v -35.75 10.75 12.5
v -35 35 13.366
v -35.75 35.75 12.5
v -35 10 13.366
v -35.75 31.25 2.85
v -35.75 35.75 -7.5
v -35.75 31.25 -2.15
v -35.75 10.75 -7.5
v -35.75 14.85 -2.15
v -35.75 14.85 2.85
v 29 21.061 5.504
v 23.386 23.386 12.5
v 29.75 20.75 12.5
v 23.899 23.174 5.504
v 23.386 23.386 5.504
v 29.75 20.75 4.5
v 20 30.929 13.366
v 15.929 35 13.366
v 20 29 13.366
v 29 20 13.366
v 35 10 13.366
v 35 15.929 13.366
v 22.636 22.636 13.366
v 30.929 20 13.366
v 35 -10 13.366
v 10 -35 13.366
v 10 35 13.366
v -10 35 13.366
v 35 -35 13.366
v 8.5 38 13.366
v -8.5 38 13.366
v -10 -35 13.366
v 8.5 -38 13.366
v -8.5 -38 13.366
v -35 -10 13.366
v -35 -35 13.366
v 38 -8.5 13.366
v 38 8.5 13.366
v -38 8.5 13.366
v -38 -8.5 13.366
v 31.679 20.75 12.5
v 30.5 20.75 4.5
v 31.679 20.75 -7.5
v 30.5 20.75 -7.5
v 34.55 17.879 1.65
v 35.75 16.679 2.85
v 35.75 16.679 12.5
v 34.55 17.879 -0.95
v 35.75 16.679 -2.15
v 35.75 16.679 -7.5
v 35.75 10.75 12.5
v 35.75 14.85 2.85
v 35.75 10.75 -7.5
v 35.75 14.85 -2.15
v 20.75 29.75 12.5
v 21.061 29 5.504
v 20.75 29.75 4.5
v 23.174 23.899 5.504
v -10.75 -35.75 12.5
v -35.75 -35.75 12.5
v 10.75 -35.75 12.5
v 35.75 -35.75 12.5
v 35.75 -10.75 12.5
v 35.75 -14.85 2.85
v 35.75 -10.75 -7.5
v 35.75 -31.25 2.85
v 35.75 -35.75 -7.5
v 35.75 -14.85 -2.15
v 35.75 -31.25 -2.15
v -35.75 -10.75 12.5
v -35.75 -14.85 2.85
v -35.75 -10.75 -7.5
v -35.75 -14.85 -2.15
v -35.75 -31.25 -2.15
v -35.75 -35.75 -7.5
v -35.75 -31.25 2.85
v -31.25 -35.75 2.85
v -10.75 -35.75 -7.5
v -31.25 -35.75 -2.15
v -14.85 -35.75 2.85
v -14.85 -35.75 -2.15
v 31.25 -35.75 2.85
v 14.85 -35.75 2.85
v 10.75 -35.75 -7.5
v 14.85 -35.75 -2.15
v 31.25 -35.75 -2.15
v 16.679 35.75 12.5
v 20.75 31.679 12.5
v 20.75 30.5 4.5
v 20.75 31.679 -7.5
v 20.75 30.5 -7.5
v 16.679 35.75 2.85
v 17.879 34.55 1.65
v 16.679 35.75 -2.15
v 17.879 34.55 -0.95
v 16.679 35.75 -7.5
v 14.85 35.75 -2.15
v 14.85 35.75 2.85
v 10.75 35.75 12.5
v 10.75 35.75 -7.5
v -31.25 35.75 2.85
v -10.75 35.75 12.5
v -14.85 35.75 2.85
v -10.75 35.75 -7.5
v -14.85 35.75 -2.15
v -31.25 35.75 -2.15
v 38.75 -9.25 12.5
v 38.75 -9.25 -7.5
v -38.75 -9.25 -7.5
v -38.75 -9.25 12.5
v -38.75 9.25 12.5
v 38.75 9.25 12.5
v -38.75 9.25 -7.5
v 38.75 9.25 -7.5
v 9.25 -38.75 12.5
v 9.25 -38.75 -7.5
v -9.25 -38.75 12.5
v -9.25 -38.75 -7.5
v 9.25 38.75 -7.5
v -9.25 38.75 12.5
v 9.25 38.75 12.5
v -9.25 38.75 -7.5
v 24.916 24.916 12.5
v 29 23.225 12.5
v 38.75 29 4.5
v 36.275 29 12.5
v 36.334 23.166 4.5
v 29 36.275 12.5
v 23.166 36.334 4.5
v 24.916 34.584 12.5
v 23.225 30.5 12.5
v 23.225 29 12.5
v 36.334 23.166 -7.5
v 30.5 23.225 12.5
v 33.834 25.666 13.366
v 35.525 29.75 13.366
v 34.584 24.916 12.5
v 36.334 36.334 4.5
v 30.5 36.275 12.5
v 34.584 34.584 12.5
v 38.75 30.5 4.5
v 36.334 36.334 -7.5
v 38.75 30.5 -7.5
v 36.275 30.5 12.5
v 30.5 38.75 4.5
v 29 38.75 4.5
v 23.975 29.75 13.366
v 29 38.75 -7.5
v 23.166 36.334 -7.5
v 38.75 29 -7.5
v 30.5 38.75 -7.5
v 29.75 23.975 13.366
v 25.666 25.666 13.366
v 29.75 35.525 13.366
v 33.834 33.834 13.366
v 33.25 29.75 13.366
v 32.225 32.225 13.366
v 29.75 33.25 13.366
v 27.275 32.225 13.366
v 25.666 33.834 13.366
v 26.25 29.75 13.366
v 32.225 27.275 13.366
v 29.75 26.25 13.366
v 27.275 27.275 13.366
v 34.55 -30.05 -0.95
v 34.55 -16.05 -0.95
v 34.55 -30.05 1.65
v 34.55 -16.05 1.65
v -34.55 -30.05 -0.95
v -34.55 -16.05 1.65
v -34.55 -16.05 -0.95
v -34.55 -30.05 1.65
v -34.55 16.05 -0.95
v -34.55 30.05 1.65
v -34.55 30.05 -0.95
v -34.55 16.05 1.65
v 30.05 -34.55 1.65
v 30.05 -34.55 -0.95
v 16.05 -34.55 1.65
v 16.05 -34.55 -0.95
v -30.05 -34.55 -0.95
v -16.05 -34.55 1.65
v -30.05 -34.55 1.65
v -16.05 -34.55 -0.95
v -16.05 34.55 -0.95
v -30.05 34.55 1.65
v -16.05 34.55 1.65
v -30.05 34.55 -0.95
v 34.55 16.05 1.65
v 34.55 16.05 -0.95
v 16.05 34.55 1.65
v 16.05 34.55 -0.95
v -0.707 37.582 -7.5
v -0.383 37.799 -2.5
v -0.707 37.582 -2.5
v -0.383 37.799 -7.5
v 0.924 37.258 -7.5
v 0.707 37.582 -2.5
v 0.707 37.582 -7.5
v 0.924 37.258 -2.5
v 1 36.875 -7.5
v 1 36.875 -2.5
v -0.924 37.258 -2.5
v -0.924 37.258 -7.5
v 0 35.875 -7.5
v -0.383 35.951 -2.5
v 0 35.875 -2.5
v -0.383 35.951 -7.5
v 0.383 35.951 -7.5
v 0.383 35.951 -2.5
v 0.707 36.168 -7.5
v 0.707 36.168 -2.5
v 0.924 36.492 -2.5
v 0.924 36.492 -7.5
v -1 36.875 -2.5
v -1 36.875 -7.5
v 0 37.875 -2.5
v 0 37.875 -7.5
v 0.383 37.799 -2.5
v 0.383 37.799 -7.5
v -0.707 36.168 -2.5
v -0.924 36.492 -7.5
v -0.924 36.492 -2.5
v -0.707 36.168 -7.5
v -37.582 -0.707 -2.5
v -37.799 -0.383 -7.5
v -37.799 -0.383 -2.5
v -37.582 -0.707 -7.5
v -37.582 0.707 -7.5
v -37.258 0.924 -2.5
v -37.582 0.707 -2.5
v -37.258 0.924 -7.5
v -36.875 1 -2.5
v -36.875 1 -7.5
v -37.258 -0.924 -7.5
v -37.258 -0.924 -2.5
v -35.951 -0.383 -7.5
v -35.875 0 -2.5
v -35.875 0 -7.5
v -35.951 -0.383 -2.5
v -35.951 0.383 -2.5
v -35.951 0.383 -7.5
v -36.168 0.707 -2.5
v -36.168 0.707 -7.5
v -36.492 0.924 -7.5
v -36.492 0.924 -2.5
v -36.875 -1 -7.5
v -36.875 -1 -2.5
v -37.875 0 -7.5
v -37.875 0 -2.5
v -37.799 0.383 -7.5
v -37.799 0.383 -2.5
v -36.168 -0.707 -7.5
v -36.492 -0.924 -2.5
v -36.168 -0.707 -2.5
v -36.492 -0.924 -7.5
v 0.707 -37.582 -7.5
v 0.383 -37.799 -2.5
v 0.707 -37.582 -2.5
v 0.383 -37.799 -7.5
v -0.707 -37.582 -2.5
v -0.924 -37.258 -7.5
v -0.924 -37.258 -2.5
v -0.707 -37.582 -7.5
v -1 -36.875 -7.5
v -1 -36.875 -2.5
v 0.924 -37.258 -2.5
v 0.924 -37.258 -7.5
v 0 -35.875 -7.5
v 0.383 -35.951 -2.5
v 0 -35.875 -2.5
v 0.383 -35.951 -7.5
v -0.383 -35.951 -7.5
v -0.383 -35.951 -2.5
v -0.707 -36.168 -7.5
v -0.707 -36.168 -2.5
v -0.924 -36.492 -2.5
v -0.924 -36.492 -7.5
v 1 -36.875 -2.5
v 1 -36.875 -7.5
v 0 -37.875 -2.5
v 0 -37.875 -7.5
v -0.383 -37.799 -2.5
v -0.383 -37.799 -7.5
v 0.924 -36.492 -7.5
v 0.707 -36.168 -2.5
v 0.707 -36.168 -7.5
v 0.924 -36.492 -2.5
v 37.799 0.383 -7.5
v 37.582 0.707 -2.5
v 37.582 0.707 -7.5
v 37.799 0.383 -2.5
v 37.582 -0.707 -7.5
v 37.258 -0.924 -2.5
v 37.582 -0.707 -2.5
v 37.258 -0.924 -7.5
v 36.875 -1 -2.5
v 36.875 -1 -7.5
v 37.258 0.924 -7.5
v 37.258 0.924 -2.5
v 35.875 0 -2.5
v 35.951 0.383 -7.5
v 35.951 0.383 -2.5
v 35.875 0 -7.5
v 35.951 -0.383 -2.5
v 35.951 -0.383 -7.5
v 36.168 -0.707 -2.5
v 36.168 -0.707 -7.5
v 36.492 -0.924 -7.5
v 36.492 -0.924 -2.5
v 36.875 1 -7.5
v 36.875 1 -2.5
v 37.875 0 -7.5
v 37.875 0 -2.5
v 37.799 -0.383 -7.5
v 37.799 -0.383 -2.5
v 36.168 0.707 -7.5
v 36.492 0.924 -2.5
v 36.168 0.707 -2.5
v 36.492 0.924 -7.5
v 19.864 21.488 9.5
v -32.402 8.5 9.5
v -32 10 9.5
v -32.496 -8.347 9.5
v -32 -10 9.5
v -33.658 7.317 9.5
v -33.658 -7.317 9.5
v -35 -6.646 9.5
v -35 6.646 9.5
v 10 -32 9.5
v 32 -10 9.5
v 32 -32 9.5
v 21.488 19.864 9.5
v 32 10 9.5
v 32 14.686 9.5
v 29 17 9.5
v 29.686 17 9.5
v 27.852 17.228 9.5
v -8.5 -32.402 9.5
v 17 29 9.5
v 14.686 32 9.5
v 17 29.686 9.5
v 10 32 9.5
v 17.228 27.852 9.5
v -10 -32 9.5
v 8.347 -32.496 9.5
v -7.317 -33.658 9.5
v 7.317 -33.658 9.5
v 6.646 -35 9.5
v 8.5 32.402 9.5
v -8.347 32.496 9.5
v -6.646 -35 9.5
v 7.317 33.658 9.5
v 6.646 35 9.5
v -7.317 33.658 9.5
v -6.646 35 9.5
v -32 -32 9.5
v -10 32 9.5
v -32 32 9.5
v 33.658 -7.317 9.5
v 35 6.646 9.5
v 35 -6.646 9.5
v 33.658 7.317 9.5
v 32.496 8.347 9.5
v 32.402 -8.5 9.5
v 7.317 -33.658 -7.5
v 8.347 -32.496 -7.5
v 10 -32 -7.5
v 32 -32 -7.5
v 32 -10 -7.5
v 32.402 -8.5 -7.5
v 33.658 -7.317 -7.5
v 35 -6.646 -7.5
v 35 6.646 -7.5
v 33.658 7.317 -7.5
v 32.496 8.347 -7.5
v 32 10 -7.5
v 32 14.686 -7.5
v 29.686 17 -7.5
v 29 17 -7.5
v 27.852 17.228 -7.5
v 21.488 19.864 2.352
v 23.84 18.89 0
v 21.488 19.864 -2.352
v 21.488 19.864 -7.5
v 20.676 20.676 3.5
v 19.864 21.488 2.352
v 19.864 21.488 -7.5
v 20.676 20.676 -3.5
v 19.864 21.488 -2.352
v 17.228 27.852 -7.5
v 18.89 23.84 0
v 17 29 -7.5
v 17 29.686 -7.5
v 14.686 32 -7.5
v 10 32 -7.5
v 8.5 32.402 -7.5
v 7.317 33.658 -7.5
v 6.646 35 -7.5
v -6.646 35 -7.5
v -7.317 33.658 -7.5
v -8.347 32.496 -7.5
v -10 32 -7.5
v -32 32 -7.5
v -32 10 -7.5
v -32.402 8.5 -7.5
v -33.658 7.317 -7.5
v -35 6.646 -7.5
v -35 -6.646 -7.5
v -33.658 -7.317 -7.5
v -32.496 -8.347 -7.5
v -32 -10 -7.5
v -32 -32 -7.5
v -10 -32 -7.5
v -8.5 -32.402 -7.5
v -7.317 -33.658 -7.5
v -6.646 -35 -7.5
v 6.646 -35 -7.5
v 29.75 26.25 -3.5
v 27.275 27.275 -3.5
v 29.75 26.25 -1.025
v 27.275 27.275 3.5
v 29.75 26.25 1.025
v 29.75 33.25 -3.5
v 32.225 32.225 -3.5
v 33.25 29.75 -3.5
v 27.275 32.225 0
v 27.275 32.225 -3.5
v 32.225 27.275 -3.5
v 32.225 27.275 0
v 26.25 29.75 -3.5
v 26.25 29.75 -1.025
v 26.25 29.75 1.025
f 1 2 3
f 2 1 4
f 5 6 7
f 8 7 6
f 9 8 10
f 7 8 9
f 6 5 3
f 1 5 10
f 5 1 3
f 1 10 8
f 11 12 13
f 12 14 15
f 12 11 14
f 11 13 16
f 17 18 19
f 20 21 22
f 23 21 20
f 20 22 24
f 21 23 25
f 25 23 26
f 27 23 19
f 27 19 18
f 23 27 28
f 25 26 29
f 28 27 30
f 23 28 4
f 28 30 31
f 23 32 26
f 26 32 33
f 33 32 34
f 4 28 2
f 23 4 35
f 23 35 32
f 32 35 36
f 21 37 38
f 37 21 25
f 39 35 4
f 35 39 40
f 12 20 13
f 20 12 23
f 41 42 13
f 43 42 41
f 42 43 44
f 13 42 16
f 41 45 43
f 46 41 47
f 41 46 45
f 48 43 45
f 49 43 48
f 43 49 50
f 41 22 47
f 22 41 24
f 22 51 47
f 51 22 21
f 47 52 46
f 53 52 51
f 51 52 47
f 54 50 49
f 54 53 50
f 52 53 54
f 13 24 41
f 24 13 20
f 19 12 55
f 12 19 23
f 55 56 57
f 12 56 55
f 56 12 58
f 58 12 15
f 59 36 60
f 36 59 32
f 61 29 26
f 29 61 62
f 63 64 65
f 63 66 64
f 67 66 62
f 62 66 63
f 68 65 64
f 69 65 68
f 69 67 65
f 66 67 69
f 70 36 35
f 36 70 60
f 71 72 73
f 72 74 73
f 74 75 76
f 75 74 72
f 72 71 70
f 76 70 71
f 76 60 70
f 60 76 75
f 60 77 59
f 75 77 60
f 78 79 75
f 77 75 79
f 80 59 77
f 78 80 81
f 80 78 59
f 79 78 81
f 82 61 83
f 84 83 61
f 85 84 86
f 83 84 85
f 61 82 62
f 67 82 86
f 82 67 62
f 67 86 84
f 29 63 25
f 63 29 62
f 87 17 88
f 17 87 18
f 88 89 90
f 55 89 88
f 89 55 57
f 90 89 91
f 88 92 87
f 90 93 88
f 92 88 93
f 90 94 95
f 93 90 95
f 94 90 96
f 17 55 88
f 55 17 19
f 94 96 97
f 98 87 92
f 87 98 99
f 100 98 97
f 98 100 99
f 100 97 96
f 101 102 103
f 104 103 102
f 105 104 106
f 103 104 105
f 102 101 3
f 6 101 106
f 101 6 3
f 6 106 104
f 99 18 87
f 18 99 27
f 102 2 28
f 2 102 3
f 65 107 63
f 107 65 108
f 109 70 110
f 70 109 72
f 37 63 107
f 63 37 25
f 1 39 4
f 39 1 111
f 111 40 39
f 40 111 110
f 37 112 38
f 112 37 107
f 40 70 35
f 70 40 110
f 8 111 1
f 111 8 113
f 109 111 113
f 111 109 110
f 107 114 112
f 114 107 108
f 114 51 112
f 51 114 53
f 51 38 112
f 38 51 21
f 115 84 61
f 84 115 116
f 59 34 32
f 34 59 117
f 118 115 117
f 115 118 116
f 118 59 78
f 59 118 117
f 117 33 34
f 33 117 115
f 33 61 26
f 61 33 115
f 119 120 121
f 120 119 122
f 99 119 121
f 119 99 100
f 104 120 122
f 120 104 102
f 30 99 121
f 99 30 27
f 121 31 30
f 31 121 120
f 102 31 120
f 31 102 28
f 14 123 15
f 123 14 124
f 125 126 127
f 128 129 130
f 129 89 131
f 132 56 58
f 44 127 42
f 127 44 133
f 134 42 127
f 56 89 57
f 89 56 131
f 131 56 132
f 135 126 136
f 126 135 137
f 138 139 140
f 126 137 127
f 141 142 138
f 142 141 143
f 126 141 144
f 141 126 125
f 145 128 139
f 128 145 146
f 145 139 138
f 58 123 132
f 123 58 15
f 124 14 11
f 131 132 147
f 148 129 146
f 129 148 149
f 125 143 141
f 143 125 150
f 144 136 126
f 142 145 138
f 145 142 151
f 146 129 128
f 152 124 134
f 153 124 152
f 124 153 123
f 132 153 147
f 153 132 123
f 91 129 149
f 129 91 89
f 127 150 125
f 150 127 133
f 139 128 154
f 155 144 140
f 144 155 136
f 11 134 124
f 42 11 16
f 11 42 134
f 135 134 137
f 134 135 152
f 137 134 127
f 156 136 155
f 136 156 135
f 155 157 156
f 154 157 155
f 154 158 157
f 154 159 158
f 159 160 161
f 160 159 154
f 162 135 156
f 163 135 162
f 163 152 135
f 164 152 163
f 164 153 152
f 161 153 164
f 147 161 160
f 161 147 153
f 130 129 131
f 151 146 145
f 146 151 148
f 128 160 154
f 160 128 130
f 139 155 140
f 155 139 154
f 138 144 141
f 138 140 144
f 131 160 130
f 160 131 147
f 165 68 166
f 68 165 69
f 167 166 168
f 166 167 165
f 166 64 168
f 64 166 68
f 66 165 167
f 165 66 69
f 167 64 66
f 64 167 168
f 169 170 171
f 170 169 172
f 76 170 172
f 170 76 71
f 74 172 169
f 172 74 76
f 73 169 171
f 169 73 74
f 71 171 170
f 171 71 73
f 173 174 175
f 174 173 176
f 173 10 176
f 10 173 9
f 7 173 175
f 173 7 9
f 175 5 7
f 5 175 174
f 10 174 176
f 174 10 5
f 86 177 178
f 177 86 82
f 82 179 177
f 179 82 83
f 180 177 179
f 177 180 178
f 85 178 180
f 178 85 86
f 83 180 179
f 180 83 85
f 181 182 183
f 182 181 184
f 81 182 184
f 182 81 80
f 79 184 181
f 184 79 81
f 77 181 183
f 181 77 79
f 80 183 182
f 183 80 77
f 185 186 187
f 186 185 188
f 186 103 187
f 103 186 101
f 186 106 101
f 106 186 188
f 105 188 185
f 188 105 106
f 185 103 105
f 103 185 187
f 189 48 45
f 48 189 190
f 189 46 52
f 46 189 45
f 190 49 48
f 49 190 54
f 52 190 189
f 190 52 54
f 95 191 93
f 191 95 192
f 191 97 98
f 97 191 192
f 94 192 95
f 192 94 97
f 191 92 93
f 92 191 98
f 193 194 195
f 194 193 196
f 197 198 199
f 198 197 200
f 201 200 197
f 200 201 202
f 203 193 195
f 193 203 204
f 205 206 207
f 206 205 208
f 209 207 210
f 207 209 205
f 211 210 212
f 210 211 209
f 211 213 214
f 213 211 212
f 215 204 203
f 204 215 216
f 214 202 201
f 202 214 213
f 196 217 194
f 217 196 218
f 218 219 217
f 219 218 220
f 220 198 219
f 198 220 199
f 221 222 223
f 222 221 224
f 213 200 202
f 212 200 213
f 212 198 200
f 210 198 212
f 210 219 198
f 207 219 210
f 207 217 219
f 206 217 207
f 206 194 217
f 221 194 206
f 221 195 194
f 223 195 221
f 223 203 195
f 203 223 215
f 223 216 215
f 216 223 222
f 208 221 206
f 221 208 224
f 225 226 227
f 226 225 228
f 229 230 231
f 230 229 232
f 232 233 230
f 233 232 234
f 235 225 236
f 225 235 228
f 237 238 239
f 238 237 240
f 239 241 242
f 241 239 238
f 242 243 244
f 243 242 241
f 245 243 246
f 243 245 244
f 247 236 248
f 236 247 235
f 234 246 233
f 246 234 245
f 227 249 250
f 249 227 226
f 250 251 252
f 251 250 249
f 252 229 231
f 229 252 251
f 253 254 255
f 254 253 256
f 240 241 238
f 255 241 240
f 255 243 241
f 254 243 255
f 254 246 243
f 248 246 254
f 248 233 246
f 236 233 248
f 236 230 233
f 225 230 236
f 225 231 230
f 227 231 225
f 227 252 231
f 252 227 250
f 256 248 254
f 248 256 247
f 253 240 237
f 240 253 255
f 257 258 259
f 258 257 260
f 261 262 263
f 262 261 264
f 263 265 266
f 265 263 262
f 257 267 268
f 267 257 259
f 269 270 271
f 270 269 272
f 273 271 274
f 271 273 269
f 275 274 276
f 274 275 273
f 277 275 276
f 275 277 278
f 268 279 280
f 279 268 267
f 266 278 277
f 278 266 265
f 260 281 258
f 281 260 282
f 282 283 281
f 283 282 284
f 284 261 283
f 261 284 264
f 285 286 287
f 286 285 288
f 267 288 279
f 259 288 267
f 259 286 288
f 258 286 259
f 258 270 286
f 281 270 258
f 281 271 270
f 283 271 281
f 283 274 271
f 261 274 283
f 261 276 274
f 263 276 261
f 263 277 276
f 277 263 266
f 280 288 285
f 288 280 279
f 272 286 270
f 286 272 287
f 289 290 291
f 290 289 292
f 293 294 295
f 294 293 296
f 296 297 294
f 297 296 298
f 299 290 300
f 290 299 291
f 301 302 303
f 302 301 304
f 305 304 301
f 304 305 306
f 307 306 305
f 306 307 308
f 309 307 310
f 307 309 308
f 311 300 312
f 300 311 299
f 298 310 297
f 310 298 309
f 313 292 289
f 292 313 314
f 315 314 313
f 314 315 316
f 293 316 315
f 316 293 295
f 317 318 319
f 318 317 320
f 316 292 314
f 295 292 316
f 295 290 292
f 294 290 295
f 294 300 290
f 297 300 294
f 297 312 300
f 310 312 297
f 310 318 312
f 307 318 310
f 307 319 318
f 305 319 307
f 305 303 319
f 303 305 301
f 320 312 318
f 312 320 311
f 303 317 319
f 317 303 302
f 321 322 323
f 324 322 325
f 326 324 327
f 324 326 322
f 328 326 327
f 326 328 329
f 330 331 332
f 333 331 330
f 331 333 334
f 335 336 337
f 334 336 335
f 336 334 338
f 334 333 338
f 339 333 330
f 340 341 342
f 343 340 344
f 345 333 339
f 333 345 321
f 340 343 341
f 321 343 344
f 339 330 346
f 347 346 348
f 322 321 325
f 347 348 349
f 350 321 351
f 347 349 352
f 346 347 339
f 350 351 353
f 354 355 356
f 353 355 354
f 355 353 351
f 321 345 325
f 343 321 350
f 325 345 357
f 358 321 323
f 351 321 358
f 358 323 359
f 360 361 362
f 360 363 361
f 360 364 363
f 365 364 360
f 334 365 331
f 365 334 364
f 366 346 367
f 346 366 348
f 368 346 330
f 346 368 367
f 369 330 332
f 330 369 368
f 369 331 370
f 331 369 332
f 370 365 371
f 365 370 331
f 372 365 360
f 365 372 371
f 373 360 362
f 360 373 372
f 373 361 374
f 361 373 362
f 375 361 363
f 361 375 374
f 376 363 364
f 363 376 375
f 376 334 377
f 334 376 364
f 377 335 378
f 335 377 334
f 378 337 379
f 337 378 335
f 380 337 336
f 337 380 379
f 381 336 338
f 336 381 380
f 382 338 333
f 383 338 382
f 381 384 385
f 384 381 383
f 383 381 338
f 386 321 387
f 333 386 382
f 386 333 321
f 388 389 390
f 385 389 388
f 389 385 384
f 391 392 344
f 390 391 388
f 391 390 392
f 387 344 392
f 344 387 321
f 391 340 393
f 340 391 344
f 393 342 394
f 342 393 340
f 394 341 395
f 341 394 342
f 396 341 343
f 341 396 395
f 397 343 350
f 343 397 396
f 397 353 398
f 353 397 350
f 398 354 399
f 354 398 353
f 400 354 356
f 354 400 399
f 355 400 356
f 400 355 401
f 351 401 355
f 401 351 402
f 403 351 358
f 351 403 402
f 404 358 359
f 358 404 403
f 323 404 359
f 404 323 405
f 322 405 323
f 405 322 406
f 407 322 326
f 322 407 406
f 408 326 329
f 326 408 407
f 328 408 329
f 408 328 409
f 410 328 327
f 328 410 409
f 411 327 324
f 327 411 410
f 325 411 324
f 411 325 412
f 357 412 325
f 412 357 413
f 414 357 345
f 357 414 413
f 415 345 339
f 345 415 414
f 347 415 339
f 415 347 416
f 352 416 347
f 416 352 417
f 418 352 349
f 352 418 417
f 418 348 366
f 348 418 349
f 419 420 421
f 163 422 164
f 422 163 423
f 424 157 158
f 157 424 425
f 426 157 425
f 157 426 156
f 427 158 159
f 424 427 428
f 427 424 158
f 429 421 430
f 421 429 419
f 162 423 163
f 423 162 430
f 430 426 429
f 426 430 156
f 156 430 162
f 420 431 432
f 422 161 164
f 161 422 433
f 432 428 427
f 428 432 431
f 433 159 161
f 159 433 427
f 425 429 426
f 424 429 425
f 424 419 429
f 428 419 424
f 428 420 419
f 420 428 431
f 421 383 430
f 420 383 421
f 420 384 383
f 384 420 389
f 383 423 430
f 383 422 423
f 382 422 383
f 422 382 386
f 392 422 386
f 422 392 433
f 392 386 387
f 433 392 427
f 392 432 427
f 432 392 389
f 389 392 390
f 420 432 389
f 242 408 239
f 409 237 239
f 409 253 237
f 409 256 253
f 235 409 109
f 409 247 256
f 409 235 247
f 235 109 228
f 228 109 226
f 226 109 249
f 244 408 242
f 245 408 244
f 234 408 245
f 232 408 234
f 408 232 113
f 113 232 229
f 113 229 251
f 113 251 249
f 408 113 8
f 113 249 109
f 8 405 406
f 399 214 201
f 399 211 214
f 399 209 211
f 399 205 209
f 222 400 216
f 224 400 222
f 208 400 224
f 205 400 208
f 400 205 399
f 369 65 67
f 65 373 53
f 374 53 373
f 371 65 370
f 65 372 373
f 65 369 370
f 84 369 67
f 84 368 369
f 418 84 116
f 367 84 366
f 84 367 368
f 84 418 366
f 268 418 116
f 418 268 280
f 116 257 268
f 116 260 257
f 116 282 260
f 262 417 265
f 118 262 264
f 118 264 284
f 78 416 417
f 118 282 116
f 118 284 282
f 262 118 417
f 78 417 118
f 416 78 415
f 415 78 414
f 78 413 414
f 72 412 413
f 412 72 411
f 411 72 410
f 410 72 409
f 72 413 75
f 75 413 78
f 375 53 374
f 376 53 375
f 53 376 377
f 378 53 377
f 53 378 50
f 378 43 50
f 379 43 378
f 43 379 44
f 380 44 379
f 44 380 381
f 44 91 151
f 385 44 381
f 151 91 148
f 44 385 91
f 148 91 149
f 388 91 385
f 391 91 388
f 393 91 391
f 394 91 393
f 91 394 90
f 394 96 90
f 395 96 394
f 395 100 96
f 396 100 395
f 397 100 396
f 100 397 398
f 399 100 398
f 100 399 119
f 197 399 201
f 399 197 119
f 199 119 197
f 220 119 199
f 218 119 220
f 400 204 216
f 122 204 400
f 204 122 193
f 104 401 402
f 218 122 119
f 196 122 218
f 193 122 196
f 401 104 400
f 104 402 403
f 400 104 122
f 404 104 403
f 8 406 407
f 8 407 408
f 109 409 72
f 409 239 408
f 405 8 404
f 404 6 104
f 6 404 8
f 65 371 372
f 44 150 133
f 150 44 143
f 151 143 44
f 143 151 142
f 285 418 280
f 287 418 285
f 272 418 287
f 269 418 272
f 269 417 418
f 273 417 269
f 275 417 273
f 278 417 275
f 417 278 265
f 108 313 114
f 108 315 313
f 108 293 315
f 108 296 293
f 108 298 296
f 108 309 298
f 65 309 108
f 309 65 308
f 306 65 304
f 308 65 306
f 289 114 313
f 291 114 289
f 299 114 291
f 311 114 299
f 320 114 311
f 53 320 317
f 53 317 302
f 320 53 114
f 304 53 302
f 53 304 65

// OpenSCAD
include <Ubomb.scad>

// Normal Modules

module Wires ( ) {
    difference ( ) {
        BModule ( );
        
    }
}

module Button ( ) {
    difference ( ) {
        BModule ( );
        
    }
}

module KeyPads ( ) {
    difference ( ) {
        BModule ( );
        
    }
}

module Simon ( ) {
    ofset = 2;
    difference ( ) {
        BModule ( );
        
        for ( i = [0:3] )
        {
            rotate ( 45 + 90 * i )
            translate ( [ofset,ofset])
            cube ( module_l / 2 / sqrt ( 2 ) * 0.9 );
        }
        rotate ( 45 )
        translate ( [0,0,-module_l / 2  / sqrt ( 2 ) + module_d/2] )
        cube ( module_l  / sqrt ( 2 ) , center = true );
    }
}
Simon ( );

module WhosOn ( ) {
    difference ( ) {
        BModule ( );
        
    }
}

module Memory ( ) {
    difference ( ) {
        BModule ( );
        
    }
}

module MorseCode ( ) {
    difference ( ) {
        BModule ( );
        
    }
}

module ComplicatedWires ( ) {
    difference ( ) {
        BModule ( );
        
    }
}

module Mazes ( ) {
    difference ( ) {
        BModule ( );
        
    }
}

module Password ( ) {
    difference ( ) {
        BModule ( );
        
    }
}

// Neady Modules

module VentingGase ( ) {
    difference ( ) {
        BModule ( );
        
    }
}

module Capacitor ( ) {
    difference ( ) {
        BModule ( );
        
    }
}

module Knobs ( ) {
    difference ( ) {
        BModule ( );
        
    }
}
